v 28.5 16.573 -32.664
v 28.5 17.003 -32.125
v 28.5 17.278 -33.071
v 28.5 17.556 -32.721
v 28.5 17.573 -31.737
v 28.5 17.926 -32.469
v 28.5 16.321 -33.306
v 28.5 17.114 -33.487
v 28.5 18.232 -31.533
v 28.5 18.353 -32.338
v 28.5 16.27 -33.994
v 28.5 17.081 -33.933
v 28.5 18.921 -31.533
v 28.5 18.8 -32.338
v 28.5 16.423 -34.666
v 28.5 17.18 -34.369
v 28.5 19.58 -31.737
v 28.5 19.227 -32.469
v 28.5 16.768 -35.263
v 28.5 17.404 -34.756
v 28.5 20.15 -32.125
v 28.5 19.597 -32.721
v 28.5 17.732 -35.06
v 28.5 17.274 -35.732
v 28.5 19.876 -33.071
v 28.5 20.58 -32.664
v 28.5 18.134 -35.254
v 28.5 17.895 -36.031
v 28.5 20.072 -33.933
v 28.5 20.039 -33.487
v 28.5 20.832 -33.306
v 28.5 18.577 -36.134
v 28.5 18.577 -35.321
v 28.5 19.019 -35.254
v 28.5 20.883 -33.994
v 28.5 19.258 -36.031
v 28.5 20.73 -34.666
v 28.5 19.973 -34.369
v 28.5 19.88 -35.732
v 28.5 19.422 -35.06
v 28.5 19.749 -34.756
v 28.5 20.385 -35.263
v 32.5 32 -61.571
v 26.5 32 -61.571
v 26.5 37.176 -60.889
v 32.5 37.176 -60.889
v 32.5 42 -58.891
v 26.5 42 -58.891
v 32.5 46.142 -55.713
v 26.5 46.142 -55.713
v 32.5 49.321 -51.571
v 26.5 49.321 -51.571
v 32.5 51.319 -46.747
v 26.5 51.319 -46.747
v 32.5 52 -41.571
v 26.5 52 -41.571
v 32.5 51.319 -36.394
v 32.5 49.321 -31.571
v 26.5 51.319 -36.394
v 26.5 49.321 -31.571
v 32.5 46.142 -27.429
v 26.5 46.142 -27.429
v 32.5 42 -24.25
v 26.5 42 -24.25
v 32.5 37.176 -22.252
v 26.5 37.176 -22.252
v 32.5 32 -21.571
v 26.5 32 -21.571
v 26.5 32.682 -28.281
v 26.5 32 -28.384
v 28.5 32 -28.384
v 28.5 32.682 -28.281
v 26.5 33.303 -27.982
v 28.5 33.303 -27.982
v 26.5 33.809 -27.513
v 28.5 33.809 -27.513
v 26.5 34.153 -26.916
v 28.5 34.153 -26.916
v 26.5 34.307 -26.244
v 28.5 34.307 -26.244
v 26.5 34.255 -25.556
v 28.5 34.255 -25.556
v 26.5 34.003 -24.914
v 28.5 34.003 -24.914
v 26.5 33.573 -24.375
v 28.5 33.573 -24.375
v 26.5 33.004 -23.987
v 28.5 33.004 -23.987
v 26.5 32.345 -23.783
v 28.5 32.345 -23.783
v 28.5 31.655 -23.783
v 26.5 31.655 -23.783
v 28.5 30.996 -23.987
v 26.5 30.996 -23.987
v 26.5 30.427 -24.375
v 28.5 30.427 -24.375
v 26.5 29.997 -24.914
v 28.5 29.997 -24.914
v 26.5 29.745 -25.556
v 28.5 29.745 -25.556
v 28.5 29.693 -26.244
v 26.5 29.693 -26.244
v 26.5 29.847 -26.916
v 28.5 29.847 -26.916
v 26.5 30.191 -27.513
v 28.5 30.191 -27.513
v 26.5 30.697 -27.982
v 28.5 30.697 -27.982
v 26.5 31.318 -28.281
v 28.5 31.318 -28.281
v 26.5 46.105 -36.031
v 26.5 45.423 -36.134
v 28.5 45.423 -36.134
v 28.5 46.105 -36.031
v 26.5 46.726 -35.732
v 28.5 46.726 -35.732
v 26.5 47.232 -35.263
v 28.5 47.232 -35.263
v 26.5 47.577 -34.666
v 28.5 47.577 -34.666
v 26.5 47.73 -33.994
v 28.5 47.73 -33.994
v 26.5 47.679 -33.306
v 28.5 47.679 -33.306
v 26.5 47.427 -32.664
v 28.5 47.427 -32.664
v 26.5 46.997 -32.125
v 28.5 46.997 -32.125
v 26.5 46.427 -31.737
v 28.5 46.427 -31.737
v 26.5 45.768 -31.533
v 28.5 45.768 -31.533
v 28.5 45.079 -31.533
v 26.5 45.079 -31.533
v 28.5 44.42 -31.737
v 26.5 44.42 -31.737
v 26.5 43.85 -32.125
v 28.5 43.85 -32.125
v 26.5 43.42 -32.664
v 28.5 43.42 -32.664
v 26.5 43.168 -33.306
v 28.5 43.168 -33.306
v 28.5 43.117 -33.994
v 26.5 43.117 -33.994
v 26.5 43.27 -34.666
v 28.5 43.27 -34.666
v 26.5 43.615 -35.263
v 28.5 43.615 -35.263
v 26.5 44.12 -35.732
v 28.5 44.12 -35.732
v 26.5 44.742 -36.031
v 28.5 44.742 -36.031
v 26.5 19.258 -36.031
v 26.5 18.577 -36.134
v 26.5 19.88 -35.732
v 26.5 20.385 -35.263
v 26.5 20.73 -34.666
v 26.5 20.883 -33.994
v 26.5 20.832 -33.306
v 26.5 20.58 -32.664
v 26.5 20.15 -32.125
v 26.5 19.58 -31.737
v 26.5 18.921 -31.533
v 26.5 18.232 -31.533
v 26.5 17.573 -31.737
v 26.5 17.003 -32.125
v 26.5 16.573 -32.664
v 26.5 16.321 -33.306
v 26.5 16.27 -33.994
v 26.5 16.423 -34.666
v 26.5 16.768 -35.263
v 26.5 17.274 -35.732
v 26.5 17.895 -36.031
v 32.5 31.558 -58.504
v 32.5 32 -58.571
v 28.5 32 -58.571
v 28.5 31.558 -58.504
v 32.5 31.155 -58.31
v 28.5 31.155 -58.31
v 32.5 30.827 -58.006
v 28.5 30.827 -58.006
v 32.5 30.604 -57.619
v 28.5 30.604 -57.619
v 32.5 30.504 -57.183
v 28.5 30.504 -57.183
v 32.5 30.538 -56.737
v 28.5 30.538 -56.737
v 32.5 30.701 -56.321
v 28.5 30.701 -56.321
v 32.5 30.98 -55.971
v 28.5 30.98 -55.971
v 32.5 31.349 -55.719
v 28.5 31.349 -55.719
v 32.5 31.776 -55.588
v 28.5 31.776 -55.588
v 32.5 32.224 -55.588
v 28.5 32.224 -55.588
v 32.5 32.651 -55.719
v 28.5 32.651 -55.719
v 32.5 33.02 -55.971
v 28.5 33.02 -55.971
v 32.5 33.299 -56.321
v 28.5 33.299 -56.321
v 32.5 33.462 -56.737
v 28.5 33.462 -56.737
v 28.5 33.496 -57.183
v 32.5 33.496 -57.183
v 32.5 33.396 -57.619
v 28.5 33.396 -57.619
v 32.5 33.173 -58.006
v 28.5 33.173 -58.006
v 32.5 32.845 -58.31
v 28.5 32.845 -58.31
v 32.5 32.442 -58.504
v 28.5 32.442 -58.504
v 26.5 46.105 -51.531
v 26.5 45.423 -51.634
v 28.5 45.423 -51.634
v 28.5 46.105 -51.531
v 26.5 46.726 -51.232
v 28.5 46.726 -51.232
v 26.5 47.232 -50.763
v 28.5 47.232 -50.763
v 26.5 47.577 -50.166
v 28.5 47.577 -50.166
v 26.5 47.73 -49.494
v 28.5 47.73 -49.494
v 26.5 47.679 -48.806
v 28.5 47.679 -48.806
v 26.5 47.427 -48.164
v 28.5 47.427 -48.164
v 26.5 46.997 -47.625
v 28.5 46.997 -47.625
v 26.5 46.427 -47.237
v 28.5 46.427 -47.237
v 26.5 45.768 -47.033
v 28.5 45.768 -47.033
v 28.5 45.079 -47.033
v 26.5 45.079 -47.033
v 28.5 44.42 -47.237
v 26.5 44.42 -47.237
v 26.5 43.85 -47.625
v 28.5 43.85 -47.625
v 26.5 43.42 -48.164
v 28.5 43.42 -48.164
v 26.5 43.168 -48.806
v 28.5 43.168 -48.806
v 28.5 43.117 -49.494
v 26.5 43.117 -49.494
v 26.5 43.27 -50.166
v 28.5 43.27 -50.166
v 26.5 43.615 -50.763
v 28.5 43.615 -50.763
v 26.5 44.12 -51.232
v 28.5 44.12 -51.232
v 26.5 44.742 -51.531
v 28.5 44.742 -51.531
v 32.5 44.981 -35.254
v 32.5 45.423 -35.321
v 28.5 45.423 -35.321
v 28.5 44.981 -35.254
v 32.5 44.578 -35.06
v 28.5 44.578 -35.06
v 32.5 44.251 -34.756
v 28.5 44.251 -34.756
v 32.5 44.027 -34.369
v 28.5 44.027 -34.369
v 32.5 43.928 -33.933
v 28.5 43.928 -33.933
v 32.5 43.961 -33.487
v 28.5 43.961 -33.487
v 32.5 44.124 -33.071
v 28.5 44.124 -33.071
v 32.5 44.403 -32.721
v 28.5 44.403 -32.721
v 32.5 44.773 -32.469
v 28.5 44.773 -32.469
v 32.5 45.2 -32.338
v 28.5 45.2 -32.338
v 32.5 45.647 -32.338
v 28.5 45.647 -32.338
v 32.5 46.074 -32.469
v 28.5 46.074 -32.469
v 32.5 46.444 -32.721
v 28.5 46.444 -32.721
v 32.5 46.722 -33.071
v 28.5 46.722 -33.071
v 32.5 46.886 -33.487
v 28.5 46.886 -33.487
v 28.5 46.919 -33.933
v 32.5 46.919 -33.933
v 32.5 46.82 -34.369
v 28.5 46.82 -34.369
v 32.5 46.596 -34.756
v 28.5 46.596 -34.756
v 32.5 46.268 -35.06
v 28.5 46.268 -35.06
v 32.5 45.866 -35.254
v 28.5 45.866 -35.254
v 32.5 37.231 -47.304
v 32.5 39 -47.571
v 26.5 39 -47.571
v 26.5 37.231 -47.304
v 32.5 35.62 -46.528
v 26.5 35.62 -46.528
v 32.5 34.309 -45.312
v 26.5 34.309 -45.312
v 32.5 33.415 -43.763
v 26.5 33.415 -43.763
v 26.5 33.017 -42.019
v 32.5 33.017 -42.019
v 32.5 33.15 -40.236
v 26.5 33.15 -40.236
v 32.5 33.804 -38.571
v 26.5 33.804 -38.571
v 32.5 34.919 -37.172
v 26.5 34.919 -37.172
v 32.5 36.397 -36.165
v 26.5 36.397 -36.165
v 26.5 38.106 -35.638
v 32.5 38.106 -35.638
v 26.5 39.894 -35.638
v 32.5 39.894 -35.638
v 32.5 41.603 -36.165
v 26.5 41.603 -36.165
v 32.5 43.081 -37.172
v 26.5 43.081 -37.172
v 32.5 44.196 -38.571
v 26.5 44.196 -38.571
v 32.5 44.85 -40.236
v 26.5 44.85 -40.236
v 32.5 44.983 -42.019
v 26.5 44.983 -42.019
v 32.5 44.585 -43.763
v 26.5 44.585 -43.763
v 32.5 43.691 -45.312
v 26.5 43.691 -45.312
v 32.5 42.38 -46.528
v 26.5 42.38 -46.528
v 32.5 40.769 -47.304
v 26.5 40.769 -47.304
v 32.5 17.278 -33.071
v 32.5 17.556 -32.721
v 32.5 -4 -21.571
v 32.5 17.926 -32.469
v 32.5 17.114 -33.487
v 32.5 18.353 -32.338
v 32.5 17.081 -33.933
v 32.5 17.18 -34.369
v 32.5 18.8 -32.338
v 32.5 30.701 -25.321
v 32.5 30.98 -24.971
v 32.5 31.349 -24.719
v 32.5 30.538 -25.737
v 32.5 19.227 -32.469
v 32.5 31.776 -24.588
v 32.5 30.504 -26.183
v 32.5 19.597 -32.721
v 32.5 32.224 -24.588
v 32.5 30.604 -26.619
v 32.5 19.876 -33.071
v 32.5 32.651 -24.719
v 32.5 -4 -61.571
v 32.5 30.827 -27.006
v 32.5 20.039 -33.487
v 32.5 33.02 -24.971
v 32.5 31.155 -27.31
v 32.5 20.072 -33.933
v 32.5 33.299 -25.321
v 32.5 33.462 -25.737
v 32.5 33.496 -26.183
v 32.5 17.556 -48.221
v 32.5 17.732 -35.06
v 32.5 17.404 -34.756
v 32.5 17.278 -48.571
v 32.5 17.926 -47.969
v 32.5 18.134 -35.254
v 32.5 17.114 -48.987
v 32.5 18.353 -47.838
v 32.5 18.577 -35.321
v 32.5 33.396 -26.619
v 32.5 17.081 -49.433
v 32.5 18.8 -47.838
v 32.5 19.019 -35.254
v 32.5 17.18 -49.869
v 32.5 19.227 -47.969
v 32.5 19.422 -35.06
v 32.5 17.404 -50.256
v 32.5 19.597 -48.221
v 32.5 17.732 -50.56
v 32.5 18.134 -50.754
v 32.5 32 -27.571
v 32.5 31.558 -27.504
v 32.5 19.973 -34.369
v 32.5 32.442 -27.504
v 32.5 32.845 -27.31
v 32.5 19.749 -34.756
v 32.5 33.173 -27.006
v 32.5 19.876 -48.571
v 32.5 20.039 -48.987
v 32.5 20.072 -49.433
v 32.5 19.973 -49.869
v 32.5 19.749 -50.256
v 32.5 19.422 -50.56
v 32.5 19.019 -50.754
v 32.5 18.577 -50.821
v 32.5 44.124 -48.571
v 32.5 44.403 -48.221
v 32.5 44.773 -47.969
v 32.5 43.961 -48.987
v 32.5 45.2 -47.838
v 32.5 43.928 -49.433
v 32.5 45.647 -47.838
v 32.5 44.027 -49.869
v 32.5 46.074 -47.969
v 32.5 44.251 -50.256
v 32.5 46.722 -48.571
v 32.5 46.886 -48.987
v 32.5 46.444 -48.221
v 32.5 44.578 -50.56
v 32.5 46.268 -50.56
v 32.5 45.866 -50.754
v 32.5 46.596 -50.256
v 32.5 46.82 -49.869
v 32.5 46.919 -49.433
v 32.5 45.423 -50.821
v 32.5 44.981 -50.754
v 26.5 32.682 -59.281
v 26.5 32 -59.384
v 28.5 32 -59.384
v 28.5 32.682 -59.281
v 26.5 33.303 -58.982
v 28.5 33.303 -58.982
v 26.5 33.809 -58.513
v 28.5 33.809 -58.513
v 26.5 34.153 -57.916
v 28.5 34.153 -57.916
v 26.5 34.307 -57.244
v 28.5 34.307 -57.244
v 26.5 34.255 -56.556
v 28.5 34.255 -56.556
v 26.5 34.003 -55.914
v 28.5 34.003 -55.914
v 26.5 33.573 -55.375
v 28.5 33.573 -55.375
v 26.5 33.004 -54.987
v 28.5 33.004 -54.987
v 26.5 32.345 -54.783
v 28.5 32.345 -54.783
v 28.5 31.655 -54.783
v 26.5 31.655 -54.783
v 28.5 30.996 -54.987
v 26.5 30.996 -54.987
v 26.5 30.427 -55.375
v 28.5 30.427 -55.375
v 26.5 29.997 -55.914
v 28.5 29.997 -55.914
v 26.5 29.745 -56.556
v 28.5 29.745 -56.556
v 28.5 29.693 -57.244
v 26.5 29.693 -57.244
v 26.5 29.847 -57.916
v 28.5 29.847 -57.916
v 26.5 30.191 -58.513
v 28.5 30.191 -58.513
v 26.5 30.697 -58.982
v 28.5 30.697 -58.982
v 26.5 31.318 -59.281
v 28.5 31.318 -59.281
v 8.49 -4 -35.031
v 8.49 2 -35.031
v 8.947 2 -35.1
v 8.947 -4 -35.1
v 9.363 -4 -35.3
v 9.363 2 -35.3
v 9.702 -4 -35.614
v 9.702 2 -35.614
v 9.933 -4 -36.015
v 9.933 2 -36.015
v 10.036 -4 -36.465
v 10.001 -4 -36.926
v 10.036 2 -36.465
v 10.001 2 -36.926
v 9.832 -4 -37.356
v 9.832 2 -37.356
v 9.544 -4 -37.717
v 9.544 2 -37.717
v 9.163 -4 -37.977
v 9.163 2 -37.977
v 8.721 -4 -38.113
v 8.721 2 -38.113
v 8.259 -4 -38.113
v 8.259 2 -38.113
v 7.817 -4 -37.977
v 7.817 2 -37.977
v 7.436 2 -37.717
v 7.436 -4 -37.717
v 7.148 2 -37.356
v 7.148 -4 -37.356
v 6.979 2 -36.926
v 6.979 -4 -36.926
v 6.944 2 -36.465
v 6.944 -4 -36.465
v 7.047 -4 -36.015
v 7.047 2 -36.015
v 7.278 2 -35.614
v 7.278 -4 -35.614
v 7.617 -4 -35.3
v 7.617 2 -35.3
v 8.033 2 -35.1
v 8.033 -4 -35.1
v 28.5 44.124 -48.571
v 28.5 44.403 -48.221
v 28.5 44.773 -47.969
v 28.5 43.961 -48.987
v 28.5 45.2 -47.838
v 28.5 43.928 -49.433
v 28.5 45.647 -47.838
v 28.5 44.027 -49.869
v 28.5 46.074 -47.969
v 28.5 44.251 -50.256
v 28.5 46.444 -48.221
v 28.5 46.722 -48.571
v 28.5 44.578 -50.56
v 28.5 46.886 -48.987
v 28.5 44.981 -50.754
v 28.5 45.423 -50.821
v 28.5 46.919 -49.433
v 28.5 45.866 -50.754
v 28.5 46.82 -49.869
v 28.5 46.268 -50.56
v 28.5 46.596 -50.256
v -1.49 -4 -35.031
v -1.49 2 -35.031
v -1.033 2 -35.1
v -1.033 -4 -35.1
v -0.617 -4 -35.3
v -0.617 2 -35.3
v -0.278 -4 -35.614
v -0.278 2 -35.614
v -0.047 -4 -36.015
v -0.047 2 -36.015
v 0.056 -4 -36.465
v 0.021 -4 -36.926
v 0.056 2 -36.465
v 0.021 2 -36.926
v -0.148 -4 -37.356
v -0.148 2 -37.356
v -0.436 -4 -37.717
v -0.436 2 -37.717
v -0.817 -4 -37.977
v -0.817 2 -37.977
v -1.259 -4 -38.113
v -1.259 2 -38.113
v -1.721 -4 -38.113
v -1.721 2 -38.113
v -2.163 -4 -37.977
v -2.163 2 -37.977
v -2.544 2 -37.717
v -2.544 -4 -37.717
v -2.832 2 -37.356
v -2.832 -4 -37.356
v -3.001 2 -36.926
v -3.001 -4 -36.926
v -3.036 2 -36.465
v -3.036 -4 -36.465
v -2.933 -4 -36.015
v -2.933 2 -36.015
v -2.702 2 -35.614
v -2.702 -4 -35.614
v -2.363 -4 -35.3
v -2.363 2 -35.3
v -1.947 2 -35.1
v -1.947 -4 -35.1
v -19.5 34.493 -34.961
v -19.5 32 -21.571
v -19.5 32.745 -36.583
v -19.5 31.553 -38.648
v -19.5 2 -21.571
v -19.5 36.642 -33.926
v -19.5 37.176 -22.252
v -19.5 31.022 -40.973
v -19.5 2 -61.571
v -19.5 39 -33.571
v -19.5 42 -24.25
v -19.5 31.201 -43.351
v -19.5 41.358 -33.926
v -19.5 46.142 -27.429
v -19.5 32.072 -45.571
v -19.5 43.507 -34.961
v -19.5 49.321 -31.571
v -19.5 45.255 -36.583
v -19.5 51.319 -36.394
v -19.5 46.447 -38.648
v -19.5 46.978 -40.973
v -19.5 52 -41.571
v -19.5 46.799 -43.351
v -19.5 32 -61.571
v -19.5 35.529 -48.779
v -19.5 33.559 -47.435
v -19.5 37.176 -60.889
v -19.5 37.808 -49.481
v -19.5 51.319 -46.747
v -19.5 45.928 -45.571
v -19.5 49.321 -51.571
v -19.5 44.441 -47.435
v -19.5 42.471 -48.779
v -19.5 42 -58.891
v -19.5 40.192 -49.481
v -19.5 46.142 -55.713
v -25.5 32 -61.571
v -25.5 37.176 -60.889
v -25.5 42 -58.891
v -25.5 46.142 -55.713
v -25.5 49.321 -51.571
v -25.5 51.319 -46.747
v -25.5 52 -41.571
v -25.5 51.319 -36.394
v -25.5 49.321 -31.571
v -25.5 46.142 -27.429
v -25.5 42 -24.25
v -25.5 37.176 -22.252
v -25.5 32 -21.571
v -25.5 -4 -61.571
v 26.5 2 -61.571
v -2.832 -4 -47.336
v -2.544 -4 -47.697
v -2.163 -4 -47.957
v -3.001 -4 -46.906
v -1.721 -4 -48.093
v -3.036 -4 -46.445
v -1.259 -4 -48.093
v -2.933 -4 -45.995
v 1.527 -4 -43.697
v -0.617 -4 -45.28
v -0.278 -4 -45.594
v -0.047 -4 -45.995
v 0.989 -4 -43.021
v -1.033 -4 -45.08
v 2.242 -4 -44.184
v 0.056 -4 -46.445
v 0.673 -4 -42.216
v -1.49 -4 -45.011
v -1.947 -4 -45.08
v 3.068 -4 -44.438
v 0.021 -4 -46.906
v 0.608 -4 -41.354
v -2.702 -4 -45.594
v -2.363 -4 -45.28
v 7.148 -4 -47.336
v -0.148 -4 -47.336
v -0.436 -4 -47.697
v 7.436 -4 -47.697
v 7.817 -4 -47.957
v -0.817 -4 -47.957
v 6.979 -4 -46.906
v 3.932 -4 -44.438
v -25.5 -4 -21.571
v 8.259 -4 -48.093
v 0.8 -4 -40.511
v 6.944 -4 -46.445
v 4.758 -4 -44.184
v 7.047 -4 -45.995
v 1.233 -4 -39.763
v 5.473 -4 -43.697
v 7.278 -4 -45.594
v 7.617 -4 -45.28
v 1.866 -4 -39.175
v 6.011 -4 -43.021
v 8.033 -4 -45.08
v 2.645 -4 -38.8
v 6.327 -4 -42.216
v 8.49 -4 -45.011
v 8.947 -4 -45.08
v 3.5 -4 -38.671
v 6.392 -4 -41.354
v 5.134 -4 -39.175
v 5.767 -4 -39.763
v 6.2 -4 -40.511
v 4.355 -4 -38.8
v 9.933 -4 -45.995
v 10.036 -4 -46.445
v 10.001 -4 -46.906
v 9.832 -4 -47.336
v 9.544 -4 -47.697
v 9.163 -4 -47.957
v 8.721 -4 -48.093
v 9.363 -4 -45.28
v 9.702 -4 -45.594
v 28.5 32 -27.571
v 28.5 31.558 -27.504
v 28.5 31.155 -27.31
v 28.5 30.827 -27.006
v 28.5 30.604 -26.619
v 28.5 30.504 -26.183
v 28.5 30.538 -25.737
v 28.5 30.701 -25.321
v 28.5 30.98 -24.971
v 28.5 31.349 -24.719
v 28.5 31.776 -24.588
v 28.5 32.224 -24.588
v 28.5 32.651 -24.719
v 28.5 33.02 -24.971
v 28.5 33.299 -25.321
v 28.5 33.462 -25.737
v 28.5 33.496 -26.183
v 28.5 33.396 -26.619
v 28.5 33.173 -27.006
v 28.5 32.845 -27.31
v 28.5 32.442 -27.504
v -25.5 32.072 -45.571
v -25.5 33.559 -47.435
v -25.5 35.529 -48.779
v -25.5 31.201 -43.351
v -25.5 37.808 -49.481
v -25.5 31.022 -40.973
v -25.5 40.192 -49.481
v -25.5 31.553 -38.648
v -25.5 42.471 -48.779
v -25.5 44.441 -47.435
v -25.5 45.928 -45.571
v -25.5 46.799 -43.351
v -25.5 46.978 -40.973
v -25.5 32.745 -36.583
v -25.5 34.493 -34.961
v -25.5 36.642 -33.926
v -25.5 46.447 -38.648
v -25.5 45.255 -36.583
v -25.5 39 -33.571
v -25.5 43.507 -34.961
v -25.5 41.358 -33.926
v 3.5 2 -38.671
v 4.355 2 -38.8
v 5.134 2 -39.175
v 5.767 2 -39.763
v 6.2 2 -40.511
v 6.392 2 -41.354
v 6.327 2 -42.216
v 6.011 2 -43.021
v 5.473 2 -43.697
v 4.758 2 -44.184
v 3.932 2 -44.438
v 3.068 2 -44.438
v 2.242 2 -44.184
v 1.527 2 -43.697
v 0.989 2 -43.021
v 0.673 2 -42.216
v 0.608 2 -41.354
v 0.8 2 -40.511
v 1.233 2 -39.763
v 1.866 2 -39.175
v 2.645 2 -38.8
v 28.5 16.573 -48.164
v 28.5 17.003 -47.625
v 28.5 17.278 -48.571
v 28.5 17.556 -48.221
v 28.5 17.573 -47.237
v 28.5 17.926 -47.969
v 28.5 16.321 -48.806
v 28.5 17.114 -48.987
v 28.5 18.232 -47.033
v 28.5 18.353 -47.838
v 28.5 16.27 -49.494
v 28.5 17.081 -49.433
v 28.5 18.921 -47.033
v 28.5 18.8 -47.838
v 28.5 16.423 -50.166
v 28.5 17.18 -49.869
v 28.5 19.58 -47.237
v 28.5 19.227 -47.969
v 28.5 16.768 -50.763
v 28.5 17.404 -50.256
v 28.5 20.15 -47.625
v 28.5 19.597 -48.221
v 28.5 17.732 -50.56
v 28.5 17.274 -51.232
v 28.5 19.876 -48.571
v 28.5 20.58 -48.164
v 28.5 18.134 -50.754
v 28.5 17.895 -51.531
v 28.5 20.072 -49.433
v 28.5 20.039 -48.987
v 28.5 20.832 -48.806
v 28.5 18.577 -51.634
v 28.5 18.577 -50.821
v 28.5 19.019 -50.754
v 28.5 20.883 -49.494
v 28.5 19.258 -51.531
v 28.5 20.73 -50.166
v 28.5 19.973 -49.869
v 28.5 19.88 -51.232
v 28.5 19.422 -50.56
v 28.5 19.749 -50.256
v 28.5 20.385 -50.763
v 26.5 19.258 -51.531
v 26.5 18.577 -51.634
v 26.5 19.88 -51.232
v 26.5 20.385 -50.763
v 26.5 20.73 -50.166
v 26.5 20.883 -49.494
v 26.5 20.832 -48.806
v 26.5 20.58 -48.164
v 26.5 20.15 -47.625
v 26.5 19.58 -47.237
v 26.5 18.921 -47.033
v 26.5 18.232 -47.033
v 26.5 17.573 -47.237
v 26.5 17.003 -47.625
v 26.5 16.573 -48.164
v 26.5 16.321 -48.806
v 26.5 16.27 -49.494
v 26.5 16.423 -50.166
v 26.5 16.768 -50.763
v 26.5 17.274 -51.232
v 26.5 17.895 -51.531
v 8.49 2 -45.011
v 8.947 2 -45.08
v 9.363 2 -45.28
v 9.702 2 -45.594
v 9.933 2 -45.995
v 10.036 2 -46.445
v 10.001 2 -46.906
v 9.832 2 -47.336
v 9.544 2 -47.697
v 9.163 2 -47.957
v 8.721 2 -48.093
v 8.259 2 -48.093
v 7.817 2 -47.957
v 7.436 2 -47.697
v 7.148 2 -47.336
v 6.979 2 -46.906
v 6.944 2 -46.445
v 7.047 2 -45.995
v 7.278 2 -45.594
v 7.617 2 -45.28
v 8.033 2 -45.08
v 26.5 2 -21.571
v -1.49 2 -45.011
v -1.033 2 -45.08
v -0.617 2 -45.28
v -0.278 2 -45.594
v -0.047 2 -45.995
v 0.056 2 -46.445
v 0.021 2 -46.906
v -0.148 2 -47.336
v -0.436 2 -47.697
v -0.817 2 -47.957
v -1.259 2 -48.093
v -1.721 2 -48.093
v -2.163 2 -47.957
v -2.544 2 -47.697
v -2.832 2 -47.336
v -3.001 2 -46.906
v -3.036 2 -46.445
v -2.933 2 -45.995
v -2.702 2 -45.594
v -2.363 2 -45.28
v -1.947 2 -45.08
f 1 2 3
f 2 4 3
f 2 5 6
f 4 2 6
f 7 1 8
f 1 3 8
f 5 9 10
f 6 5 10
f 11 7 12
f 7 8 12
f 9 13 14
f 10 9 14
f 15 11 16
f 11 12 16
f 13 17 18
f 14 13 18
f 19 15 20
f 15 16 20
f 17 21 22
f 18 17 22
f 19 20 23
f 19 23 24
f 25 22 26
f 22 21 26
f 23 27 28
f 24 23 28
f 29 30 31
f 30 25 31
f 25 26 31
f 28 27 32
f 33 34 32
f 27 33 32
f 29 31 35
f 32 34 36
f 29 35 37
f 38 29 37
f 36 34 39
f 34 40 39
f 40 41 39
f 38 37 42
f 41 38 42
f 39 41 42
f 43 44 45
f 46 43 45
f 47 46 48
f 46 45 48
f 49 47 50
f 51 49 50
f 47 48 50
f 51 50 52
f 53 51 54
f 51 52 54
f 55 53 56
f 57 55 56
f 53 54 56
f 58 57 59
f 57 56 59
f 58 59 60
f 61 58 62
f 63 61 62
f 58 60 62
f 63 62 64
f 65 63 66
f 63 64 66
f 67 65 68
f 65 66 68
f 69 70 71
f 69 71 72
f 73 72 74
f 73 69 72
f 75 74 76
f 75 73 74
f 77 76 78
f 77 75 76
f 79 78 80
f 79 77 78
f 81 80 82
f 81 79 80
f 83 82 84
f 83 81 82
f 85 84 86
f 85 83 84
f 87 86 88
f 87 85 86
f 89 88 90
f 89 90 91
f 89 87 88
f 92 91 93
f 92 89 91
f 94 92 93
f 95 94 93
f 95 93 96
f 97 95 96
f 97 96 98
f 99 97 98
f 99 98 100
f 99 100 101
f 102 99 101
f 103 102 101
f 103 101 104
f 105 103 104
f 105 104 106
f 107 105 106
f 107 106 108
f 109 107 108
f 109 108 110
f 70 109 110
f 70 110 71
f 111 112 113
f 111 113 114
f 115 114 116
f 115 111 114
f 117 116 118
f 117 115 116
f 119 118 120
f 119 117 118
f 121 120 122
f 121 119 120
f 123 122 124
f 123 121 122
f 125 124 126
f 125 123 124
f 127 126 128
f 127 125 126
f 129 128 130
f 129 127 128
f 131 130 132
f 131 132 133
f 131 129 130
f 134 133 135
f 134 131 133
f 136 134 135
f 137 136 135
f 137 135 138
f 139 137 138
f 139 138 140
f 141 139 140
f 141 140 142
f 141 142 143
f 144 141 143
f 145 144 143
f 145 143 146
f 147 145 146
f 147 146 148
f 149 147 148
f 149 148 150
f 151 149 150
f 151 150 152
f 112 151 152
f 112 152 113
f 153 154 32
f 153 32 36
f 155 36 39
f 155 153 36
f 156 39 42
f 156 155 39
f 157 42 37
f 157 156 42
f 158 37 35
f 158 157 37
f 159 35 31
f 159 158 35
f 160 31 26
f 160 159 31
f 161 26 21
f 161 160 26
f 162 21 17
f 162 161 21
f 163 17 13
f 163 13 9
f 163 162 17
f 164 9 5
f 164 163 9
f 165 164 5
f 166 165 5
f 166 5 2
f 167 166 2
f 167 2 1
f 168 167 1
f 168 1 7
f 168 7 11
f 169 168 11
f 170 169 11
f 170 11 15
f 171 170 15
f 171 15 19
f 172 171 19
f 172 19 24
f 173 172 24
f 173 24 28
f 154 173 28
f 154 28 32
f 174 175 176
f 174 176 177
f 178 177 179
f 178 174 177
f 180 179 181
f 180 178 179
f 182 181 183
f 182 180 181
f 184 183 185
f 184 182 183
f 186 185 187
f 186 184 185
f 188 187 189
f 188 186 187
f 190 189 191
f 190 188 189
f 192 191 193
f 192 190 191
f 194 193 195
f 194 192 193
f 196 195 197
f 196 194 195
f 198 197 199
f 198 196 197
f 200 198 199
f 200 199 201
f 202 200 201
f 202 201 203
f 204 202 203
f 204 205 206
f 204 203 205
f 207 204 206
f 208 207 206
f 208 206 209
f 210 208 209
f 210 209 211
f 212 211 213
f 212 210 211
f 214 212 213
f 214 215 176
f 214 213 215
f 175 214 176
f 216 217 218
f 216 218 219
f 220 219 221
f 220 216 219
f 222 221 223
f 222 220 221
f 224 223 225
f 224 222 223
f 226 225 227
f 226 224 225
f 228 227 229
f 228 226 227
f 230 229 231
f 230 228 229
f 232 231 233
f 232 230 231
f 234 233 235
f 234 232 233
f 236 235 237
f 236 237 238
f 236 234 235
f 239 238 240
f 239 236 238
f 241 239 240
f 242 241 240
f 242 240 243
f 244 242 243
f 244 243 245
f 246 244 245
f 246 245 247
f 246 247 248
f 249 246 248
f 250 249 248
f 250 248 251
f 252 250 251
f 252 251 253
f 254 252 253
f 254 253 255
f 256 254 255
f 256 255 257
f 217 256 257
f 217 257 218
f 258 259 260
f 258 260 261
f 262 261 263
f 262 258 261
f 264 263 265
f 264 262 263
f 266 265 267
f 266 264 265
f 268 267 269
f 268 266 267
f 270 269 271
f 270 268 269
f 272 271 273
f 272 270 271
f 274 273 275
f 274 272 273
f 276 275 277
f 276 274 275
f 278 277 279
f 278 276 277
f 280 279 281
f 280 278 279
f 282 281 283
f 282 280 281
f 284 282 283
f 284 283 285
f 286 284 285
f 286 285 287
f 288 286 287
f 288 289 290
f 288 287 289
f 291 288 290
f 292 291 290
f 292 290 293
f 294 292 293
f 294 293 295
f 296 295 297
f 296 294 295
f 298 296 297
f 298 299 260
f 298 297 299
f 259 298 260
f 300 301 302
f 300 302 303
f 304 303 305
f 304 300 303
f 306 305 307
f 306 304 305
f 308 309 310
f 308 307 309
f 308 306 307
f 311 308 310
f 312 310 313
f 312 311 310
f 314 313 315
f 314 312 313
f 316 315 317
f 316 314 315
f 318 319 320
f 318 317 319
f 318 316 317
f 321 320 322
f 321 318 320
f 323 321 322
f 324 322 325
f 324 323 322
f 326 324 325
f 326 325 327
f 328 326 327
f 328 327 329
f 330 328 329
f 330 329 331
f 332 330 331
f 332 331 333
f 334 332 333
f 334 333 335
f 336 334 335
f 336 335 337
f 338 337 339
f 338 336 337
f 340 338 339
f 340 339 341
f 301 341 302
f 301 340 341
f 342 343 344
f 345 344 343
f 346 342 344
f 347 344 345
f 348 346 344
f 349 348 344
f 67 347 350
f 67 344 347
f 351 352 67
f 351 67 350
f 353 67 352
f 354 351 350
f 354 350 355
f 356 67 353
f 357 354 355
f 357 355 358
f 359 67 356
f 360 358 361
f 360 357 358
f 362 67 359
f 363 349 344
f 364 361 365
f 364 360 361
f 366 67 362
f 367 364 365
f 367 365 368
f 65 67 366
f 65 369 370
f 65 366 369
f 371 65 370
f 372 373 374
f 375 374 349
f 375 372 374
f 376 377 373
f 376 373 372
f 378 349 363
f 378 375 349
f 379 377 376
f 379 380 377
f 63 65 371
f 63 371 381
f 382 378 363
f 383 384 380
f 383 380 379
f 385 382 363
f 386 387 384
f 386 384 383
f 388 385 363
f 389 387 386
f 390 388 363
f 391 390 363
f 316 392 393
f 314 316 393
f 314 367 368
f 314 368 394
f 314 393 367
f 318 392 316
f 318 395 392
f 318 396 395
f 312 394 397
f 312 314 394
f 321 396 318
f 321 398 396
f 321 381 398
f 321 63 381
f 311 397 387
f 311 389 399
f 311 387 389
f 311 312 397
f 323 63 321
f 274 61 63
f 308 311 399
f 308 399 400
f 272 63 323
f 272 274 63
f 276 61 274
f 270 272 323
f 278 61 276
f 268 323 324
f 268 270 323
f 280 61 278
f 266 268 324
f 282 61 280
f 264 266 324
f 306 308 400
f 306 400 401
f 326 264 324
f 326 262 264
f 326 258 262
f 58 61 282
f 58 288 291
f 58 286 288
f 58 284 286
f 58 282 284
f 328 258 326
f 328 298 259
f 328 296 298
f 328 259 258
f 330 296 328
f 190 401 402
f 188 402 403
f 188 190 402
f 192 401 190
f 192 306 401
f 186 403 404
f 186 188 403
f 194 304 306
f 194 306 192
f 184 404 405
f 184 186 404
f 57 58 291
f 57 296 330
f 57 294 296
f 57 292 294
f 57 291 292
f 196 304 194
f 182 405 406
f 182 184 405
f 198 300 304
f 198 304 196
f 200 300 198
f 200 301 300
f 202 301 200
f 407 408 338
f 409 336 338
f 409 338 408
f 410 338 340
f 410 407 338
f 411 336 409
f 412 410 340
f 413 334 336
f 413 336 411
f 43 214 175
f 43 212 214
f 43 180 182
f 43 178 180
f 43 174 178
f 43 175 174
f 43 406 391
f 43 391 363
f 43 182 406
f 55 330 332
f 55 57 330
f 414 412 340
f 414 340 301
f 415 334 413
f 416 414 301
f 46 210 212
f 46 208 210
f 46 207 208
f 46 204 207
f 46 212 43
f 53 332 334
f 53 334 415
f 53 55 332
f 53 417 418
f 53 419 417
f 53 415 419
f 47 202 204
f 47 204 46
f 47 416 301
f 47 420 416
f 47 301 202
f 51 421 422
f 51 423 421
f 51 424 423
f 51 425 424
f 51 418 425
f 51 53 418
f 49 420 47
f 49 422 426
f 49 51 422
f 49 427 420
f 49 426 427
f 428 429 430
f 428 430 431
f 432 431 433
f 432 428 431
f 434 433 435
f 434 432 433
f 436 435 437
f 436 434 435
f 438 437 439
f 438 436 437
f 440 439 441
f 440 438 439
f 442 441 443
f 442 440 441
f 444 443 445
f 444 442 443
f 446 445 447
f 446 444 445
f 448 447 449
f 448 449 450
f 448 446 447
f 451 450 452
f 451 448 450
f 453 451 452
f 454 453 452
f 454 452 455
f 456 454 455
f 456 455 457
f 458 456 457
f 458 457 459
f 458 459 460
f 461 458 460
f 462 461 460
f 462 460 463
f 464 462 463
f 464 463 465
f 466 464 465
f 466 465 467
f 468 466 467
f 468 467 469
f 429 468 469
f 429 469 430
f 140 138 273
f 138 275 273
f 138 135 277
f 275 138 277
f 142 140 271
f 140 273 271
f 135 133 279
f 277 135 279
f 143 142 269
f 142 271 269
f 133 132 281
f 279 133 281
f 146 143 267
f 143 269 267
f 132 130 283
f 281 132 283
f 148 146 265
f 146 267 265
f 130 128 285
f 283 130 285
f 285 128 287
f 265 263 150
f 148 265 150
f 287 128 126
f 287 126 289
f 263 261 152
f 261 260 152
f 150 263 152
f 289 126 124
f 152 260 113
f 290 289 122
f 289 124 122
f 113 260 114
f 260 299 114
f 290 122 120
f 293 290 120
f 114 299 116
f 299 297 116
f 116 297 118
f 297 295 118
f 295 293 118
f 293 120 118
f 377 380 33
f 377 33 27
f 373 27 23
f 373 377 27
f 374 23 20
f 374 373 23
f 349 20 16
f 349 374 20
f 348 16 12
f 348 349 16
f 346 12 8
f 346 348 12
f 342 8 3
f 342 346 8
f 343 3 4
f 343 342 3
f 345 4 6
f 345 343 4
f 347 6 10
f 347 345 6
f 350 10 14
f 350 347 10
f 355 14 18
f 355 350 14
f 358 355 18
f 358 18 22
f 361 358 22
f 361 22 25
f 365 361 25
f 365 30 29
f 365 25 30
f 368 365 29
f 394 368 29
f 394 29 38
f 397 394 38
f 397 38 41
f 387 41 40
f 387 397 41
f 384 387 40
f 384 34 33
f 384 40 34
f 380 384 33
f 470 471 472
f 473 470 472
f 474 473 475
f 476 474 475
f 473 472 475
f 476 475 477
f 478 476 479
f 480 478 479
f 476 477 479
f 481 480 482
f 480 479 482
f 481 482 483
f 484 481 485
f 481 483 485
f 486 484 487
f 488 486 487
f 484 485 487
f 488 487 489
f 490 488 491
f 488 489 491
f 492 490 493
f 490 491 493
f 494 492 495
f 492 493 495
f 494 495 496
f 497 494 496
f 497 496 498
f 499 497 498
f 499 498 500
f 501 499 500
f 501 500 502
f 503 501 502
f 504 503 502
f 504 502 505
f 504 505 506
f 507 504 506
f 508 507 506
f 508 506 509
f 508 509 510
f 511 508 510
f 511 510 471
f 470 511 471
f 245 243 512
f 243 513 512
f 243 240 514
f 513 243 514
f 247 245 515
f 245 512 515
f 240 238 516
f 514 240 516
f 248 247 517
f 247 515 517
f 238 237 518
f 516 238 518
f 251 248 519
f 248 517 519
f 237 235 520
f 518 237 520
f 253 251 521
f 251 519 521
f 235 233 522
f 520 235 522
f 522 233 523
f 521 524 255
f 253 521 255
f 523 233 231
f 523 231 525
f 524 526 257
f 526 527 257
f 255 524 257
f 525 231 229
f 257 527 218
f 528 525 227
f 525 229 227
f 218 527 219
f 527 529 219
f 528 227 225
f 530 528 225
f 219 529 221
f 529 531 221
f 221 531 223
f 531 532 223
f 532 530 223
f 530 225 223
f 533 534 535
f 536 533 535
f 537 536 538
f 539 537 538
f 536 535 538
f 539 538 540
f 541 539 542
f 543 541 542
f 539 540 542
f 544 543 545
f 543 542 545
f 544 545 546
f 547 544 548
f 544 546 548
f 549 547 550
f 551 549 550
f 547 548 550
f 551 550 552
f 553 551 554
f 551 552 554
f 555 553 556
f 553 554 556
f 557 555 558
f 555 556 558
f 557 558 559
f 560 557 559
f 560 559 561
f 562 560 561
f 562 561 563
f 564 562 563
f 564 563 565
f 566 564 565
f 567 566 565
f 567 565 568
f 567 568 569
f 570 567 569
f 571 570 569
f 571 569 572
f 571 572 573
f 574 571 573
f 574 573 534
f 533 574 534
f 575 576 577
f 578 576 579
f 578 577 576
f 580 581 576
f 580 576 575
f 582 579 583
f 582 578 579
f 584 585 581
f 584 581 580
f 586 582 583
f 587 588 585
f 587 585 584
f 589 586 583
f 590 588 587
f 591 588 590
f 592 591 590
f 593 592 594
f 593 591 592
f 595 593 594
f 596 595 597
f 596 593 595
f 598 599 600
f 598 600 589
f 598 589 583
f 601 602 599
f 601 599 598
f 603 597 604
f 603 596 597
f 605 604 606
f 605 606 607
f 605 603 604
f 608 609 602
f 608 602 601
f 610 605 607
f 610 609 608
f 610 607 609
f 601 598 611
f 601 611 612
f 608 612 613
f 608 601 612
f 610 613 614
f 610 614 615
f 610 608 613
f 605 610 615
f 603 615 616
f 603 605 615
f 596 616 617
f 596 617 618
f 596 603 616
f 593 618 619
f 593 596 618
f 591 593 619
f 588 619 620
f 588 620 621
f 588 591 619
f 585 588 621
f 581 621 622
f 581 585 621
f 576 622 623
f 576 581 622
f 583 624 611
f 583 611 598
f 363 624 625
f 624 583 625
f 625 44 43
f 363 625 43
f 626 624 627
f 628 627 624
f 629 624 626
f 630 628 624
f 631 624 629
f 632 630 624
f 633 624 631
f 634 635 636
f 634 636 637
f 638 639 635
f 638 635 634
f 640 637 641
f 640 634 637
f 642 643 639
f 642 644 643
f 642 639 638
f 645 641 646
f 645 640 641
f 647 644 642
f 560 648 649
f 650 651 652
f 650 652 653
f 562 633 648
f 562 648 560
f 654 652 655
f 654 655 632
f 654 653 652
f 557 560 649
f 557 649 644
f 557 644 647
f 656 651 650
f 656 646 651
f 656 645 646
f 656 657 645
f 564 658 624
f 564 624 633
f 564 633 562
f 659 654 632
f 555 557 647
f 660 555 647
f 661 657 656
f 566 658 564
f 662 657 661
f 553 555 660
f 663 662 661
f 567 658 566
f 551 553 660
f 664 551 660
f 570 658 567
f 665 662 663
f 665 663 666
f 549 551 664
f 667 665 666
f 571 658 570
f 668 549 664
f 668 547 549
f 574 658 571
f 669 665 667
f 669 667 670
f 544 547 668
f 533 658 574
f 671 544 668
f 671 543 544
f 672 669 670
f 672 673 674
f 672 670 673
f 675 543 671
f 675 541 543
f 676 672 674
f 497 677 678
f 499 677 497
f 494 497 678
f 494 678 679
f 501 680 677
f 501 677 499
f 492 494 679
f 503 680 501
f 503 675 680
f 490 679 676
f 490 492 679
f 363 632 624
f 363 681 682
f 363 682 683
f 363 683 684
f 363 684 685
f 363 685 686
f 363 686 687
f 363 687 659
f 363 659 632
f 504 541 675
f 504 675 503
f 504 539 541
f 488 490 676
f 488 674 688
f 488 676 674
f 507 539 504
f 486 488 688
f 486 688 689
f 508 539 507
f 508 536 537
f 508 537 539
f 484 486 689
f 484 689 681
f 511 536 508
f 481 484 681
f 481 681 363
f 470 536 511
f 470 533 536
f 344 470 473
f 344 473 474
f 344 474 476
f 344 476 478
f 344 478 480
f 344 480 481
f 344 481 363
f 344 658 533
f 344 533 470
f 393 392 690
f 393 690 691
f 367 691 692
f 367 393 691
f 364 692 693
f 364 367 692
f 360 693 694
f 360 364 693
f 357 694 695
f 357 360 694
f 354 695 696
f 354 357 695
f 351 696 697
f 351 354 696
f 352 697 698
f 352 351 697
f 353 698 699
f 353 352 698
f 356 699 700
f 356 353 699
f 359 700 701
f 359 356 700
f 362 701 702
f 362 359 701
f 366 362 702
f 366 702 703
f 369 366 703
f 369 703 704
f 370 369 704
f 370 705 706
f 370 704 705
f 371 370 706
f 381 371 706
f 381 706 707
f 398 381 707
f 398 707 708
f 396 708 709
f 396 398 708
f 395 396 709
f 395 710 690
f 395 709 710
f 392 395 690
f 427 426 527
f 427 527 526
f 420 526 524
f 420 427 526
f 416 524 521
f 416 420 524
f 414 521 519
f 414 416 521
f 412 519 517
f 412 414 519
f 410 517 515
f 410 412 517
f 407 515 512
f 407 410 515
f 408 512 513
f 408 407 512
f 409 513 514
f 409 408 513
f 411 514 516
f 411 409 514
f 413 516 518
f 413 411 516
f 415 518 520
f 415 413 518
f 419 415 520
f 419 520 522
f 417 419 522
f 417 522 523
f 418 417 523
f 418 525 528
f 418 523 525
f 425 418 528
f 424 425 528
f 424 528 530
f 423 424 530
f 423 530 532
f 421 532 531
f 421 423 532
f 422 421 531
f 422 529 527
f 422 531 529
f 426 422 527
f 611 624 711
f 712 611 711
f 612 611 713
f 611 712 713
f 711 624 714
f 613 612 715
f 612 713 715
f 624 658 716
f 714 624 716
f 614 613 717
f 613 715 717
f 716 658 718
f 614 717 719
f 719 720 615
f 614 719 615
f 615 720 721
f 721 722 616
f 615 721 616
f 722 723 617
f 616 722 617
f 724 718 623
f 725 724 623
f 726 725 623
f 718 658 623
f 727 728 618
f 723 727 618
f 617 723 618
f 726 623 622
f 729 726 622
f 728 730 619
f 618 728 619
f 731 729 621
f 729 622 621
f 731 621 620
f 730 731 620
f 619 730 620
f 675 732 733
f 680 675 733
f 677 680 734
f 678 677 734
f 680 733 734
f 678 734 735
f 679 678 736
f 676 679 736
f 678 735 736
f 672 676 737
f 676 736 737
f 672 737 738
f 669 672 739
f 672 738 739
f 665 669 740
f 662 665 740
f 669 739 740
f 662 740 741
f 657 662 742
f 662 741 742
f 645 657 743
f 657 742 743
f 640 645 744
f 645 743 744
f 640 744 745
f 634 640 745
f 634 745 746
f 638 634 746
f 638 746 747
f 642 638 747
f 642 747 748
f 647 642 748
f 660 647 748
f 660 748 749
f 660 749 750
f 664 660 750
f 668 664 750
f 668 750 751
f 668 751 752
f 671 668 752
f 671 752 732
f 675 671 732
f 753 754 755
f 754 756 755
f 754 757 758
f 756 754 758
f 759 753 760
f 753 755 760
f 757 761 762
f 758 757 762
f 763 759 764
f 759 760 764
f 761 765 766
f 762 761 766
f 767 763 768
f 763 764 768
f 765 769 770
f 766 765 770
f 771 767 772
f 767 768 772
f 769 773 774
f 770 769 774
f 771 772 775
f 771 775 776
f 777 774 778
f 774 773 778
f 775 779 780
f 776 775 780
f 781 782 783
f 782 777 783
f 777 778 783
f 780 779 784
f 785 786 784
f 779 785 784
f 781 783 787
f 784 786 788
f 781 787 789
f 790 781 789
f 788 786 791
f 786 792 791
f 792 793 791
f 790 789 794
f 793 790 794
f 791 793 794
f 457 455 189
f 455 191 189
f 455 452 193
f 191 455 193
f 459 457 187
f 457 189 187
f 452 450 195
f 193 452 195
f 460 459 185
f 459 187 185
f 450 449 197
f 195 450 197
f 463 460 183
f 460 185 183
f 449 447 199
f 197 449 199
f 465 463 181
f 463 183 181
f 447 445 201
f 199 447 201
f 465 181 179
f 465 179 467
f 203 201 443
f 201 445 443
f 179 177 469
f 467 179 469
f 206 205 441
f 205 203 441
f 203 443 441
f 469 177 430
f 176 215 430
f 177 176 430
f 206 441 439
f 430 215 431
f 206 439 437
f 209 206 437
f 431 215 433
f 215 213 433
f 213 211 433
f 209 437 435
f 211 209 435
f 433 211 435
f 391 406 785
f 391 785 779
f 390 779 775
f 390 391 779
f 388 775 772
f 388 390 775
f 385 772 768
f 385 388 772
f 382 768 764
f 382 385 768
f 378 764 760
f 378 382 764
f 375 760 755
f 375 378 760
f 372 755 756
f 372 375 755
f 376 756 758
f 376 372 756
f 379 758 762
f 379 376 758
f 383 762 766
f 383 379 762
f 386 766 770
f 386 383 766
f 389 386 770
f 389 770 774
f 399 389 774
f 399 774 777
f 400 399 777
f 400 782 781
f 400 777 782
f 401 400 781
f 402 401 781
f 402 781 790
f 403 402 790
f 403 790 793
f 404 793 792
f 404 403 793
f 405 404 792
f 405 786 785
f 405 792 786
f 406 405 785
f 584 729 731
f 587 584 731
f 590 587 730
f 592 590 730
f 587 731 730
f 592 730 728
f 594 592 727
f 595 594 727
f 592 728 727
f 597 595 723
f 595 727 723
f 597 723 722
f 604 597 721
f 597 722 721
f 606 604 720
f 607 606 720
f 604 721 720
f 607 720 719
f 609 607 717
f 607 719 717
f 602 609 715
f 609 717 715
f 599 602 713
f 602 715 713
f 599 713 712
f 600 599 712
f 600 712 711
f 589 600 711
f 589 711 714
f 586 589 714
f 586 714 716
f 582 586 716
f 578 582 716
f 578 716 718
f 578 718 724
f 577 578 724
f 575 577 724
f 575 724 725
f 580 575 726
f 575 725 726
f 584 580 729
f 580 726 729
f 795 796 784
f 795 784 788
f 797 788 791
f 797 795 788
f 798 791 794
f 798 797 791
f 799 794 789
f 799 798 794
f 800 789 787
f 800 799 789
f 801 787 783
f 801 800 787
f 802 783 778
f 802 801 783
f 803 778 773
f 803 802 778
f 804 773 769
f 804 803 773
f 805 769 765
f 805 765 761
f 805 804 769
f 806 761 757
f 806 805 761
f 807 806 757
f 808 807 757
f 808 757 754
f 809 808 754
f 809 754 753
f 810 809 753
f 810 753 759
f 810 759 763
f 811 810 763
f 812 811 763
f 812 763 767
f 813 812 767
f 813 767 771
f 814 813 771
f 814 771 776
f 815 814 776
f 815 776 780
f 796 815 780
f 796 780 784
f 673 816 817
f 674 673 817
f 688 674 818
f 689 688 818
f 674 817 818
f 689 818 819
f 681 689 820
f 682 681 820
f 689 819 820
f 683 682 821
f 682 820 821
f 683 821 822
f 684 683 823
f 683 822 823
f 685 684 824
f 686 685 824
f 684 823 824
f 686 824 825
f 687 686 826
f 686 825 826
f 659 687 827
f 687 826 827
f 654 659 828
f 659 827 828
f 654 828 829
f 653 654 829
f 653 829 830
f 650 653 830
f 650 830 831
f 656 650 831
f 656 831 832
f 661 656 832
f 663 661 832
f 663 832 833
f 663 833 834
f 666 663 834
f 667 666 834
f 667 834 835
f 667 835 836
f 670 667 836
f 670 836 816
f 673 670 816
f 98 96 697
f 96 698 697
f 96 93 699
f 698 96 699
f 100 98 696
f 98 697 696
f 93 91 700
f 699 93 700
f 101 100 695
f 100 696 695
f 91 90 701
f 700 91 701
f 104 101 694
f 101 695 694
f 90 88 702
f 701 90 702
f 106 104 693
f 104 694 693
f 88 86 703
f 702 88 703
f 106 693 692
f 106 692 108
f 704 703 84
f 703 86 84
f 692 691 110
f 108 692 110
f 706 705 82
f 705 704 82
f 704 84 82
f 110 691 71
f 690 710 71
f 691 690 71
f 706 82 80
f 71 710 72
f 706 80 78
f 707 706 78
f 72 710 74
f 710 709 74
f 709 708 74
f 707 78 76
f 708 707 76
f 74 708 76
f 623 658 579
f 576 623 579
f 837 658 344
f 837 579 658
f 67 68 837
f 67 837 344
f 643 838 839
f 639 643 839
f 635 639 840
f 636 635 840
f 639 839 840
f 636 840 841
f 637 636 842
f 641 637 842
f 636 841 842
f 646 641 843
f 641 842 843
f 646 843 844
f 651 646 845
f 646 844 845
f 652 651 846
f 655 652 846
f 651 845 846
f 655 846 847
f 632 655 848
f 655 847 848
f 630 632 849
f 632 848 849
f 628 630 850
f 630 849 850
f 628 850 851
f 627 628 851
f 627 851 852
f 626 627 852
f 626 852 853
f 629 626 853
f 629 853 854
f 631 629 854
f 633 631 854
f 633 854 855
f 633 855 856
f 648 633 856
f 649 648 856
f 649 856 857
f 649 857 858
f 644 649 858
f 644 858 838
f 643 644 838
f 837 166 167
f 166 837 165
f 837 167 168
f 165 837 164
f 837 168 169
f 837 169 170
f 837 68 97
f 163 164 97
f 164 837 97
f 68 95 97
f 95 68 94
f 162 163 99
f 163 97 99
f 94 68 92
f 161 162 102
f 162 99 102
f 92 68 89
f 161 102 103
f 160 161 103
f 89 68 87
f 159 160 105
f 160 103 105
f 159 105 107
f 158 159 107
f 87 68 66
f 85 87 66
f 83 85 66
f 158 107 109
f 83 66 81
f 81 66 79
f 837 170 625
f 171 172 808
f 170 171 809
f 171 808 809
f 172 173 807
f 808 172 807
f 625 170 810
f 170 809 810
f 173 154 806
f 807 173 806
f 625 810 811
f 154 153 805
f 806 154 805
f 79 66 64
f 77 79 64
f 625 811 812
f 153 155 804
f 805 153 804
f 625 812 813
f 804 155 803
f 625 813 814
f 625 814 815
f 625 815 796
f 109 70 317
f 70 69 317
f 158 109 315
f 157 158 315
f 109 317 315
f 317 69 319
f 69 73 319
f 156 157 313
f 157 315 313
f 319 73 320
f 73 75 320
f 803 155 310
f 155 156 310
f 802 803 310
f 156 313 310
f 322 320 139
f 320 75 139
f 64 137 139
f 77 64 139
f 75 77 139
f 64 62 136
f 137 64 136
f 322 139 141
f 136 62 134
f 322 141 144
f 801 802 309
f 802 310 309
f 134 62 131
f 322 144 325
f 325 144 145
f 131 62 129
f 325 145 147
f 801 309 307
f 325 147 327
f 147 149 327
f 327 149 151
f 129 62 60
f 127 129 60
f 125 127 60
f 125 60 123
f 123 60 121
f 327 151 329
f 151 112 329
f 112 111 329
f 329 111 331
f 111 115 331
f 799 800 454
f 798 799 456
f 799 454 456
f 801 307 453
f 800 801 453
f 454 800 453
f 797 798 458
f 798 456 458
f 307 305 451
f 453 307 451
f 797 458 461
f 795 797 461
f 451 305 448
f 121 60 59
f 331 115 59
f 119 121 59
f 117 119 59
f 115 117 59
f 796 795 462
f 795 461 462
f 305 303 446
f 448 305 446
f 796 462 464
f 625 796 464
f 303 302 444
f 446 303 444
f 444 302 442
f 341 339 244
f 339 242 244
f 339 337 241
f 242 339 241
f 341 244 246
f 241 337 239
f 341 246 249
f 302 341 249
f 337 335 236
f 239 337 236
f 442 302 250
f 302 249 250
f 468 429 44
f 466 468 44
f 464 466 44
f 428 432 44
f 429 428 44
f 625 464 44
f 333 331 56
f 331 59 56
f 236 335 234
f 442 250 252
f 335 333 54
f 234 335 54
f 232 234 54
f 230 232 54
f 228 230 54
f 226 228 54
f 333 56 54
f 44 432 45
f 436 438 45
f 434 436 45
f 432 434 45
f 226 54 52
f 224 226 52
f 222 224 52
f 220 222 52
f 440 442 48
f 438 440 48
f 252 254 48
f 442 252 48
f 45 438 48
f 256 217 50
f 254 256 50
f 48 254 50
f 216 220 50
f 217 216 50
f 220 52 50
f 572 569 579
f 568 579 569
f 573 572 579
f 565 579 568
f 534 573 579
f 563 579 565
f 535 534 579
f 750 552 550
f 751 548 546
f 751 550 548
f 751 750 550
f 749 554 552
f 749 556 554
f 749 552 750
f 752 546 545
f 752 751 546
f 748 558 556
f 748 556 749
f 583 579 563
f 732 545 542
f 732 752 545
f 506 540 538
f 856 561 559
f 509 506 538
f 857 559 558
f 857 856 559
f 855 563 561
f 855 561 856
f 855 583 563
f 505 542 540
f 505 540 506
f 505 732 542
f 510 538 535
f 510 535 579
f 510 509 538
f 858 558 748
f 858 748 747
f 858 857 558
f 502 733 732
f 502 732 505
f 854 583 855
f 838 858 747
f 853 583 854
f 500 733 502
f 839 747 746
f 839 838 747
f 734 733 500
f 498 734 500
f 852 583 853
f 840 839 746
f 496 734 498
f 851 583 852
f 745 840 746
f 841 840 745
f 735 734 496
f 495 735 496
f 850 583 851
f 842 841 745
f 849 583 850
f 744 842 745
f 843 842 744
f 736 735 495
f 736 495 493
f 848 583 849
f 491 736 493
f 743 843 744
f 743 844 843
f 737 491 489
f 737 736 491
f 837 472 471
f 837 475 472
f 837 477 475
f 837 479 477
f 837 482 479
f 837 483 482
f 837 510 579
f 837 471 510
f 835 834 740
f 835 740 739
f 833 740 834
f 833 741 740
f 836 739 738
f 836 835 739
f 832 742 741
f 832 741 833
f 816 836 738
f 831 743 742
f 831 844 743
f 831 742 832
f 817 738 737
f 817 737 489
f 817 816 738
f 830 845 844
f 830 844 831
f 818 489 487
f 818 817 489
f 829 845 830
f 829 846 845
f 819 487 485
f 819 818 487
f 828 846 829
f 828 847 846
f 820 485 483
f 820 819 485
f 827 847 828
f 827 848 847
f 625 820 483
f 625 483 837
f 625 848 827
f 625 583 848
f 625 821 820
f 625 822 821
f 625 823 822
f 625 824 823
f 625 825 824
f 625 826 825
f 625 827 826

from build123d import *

# Parameters (mm, degrees)
BOSS_EXTRUDE2_DEPTH         = 2
BOSS_EXTRUDE2_DEPTH_BACK    = 4
SKETCH2_W                   = 50
SKETCH2_H                   = 40
BOSS_EXTRUDE3_DEPTH         = 4
BOSS_EXTRUDE3_DEPTH_BACK    = 2
BOSS_EXTRUDE4_DEPTH         = 4
BOSS_EXTRUDE4_DEPTH_BACK    = 2
CUT_EXTRUDE1_DEPTH          = 10
CUT_EXTRUDE1_DEPTH_BACK     = 92
SKETCH7_R                   = 1.5
SKETCH7_R_2                 = 6
SKETCH8_R                   = 2.9
SKETCH8_R_2                 = 1.55
CUT_EXTRUDE2_DEPTH          = 92
SKETCH10_W                  = 4
SKETCH10_H                  = 6
BOSS_EXTRUDE5_DEPTH         = 40
IZIM1_R                     = 2.313202435
KES_EKSTR_ZYON1_DEPTH       = 48
Y_KSEKLIK_EKSTR_ZYON1_DEPTH = 6
IZIM3_R                     = 8
KES_EKSTR_ZYON2_DEPTH       = 6


with BuildPart() as part:
    # Sketch2 → Boss-Extrude2 (new, two sides: drawn at the far end of the back side and taken through both)
    with BuildSketch(Plane(origin=(0, 0, 0), x_dir=(1, 0, 0), z_dir=(0, 1, 0)).offset(-BOSS_EXTRUDE2_DEPTH_BACK)):
        with Locations((3.5, 41.570780176)):
            Rectangle(SKETCH2_W, SKETCH2_H)
    extrude(amount=BOSS_EXTRUDE2_DEPTH + BOSS_EXTRUDE2_DEPTH_BACK)

    # Sketch4 → Boss-Extrude3 (add, two sides: drawn at the far end of the back side and taken through both)
    with BuildSketch(Plane.ZY.offset(21.5).offset(-BOSS_EXTRUDE3_DEPTH_BACK)):
        with BuildLine():
            Line((-21.570780176, 2), (-61.570780176, 2))
            Line((-61.570780176, 2), (-61.570780176, 32))
            ThreePointArc((-61.570780176, 32), (-41.570780176, 52), (-21.570780176, 32))
            Line((-21.570780176, 32), (-21.570780176, 2))
        make_face()
    extrude(amount=BOSS_EXTRUDE3_DEPTH + BOSS_EXTRUDE3_DEPTH_BACK)

    # Sketch5 → Boss-Extrude4 (add, two sides: drawn at the far end of the back side and taken through both)
    with BuildSketch(Plane(origin=(28.5, 0, 0), x_dir=(0, 0, -1), z_dir=(1, 0, 0)).offset(-BOSS_EXTRUDE4_DEPTH_BACK)):
        with BuildLine():
            Line((21.570780176, -4), (61.570780176, -4))
            Line((61.570780176, -4), (61.570780176, 32))
            ThreePointArc((61.570780176, 32), (41.570780176, 52), (21.570780176, 32))
            Line((21.570780176, 32), (21.570780176, -4))
        make_face()
    extrude(amount=BOSS_EXTRUDE4_DEPTH + BOSS_EXTRUDE4_DEPTH_BACK)

    # Sketch7 → Cut-Extrude1 (cut, two sides: drawn at the far end of the back side and taken through both)
    with BuildSketch(Plane.ZY.offset(21.5).offset(-CUT_EXTRUDE1_DEPTH_BACK)):
        with Locations(Location((-26.070780176, 32, 0), (0, 0, 180))):
            Circle(SKETCH7_R)
        with Locations(Location((-33.820780176, 18.576606241, 0), (0, 0, 180))):
            Circle(SKETCH7_R)
        with Locations(Location((-49.320780176, 18.576606241, 0), (0, 0, 180))):
            Circle(SKETCH7_R)
        with Locations(Location((-57.070780176, 32, 0), (0, 0, 180))):
            Circle(SKETCH7_R)
        with Locations(Location((-49.320780176, 45.423393759, 0), (0, 0, 180))):
            Circle(SKETCH7_R)
        with Locations(Location((-33.820780176, 45.423393759, 0), (0, 0, 180))):
            Circle(SKETCH7_R)
        with Locations(Location((-41.570780176, 39, 0), (0, 0, 180))):
            Circle(SKETCH7_R_2)
    extrude(amount=CUT_EXTRUDE1_DEPTH + CUT_EXTRUDE1_DEPTH_BACK, mode=Mode.SUBTRACT)

    # Sketch8 → Cut-Extrude2 (cut)
    with BuildSketch(Plane(origin=(0, 2, 0), x_dir=(1, 0, 0), z_dir=(0, 1, 0))):
        with Locations(Location((3.5, 41.570780176, 0), (0, 0, 270))):
            Circle(SKETCH8_R)
        with Locations(Location((-1.49, 46.560780176, 0), (0, 0, 270))):
            Circle(SKETCH8_R_2)
        with Locations(Location((8.49, 46.560780176, 0), (0, 0, 270))):
            Circle(SKETCH8_R_2)
        with Locations(Location((-1.49, 36.580780176, 0), (0, 0, 270))):
            Circle(SKETCH8_R_2)
        with Locations(Location((8.49, 36.580780176, 0), (0, 0, 270))):
            Circle(SKETCH8_R_2)
    extrude(amount=-CUT_EXTRUDE2_DEPTH, mode=Mode.SUBTRACT)

    # Sketch10 → Boss-Extrude5 (add)
    with BuildSketch(Plane.XY.offset(-21.570780176)):
        with Locations((-23.5, -1)):
            Rectangle(SKETCH10_W, SKETCH10_H)
    extrude(amount=-BOSS_EXTRUDE5_DEPTH)

    # Çizim1 → Kes-Ekstrüzyon1 (cut)
    with BuildSketch(Plane(origin=(-19.5, 0, 0), x_dir=(0, 0, -1), z_dir=(1, 0, 0))):
        with Locations((26.070780176, 32)):
            Circle(IZIM1_R)
        with Locations((33.820780176, 45.423393759)):
            Circle(IZIM1_R)
        with Locations((49.320780176, 45.423393759)):
            Circle(IZIM1_R)
        with Locations((57.070780176, 32)):
            Circle(IZIM1_R)
        with Locations((49.320780176, 18.576606241)):
            Circle(IZIM1_R)
        with Locations((33.820780176, 18.576606241)):
            Circle(IZIM1_R)
    extrude(amount=KES_EKSTR_ZYON1_DEPTH, mode=Mode.SUBTRACT)

    # Çizim2 → Yükseklik-Ekstrüzyon1 (add)
    with BuildSketch(Plane.ZY.offset(25.5)):
        with BuildLine():
            Line((-21.570780176, -4), (-21.570780176, 32))
            ThreePointArc((-21.570780176, 32), (-41.570780176, 52), (-61.570780176, 32))
            Line((-61.570780176, 32), (-61.570780176, -4))
            Line((-61.570780176, -4), (-21.570780176, -4))
        make_face()
    extrude(amount=-Y_KSEKLIK_EKSTR_ZYON1_DEPTH)

    # Çizim3 → Kes-Ekstrüzyon2 (cut)
    with BuildSketch(Plane.ZY.offset(25.5)):
        with Locations((-41.570780176, 39)):
            Circle(IZIM3_R)
    extrude(amount=-KES_EKSTR_ZYON2_DEPTH, mode=Mode.SUBTRACT)


solid = part.part
